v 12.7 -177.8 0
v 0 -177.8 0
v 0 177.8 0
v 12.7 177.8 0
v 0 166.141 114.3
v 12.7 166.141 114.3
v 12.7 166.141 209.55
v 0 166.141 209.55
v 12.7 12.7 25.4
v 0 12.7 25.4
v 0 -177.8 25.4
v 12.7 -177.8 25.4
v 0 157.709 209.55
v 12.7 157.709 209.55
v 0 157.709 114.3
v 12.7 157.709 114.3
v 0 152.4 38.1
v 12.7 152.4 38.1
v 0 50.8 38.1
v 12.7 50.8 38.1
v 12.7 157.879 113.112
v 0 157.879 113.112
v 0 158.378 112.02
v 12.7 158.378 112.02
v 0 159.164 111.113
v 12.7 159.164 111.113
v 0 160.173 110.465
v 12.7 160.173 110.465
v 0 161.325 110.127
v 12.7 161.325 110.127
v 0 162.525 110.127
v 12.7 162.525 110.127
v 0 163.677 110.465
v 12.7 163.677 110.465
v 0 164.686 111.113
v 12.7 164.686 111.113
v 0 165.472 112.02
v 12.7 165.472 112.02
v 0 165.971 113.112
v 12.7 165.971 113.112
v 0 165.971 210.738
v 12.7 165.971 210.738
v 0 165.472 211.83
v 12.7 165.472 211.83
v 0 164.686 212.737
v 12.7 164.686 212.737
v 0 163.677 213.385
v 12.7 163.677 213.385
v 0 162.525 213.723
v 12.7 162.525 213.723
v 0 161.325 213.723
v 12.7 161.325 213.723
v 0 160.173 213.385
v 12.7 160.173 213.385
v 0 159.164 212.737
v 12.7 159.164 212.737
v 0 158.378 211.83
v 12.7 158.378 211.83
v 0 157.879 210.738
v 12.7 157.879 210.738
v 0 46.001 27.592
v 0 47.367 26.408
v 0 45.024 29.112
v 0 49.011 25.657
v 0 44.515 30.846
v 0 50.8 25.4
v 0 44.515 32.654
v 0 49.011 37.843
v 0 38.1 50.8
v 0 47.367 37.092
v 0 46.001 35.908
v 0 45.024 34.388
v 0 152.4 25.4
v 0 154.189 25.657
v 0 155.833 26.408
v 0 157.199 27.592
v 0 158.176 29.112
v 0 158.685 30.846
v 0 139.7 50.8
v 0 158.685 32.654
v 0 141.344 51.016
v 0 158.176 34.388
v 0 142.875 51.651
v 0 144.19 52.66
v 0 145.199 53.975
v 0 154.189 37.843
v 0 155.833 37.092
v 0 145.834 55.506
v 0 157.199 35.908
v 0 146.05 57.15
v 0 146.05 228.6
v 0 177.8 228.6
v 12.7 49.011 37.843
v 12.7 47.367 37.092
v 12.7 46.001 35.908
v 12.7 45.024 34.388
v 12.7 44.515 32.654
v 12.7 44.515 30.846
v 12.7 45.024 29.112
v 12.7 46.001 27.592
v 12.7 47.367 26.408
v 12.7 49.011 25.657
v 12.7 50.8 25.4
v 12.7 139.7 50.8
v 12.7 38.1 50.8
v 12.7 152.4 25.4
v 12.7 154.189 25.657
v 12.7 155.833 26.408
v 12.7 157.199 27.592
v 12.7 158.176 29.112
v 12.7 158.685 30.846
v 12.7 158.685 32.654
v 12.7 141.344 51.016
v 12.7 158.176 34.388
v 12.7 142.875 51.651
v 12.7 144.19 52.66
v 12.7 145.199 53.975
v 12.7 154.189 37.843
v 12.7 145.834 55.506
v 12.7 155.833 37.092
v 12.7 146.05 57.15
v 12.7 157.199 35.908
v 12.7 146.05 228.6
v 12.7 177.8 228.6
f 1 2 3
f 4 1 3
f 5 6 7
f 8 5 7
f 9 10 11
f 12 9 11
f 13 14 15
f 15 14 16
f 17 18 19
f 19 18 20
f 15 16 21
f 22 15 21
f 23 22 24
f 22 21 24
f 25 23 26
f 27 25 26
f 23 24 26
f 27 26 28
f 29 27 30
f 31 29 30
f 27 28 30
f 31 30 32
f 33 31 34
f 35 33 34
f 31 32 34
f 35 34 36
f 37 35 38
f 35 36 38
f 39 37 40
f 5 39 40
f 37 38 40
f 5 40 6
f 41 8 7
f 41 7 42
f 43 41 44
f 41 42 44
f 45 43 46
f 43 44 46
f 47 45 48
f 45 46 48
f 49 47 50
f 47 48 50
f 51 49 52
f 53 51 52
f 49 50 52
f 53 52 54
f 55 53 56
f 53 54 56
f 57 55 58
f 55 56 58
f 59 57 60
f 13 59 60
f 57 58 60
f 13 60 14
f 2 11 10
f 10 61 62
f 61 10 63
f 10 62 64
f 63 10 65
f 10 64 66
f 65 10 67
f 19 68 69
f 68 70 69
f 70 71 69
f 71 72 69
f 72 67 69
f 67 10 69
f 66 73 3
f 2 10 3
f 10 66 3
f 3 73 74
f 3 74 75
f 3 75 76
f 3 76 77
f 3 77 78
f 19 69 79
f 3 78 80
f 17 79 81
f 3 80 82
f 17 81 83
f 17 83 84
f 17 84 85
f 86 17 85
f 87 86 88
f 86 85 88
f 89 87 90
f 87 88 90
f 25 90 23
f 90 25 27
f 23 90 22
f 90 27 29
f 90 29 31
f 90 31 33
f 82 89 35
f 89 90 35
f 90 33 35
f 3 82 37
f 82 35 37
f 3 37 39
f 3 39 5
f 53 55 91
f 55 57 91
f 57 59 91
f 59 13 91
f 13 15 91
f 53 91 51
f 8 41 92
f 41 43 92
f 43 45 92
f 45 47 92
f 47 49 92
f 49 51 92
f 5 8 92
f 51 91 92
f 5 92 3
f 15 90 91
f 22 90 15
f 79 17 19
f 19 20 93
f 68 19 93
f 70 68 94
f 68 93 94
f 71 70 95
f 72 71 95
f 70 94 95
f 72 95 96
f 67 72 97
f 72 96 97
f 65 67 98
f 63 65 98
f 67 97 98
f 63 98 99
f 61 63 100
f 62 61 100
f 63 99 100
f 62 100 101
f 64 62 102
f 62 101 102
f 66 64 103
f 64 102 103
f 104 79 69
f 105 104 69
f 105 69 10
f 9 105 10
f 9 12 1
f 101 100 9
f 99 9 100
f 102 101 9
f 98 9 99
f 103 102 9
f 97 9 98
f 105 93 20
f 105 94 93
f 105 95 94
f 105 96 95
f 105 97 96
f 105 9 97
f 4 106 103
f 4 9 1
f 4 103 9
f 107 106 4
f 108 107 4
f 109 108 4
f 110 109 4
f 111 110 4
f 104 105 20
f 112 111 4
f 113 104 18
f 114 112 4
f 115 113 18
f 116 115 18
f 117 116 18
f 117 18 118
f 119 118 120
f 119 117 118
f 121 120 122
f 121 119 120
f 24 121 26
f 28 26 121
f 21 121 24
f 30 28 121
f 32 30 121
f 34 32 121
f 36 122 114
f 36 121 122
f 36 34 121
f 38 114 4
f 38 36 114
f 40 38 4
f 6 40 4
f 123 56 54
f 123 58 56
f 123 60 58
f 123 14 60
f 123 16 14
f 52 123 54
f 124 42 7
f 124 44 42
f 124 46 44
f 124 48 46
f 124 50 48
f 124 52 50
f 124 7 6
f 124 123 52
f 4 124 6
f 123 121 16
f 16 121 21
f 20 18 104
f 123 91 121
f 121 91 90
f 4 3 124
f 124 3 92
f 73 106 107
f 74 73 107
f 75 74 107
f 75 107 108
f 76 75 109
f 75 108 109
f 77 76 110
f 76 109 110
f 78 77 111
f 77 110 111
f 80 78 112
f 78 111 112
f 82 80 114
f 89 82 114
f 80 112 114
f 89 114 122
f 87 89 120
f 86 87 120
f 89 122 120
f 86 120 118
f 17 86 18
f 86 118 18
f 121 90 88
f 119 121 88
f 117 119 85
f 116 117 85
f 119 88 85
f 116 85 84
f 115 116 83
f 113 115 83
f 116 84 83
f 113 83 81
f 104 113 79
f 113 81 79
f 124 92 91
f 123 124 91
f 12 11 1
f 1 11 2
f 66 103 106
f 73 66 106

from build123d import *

# Parameters (mm, degrees)
F1_DEPTH = 12.7
F3_DEPTH = 12.701
F5_DEPTH = 12.701


with BuildPart() as f1:
    # F0 (on Right) → F1 (new body)
    with BuildSketch(Plane.YZ):
        Polygon((12.7, 25.4), (-177.8, 25.4), (-177.8, 0), (146.05, 0), (177.8, 0), (177.8, 25.4), align=None)
        with BuildLine():
            Line((38.1, 50.8), (12.7, 25.4))
            Line((12.7, 25.4), (177.8, 25.4))
            Line((177.8, 25.4), (177.8, 228.6))
            Line((177.8, 228.6), (146.05, 228.6))
            Line((146.05, 228.6), (146.05, 57.15))
            ThreePointArc((146.05, 57.15), (144.190128, 52.659872), (139.7, 50.8))
            Line((139.7, 50.8), (38.1, 50.8))
        make_face()
    extrude(amount=F1_DEPTH)

    # F2 (on face) → F3 (cut, through all)
    with BuildSketch(Plane.YZ.offset(12.7)):
        with BuildLine():
            ThreePointArc((166.1414, 209.55), (161.925, 213.7664), (157.7086, 209.55))
            Line((157.7086, 209.55), (157.7086, 114.3))
            ThreePointArc((157.7086, 114.3), (161.925, 110.0836), (166.1414, 114.3))
            Line((166.1414, 114.3), (166.1414, 209.55))
        make_face()
    extrude(amount=-F3_DEPTH, mode=Mode.SUBTRACT)

    # F4 (on face) → F5 (cut, through all)
    with BuildSketch(Plane.YZ.offset(12.7)):
        with BuildLine():
            Line((152.4, 38.1), (50.8, 38.1))
            ThreePointArc((50.8, 38.1), (44.45, 31.75), (50.8, 25.4))
            Line((50.8, 25.4), (152.4, 25.4))
            ThreePointArc((152.4, 25.4), (158.75, 31.75), (152.4, 38.1))
        make_face()
    extrude(amount=-F5_DEPTH, mode=Mode.SUBTRACT)


solid = f1.part
